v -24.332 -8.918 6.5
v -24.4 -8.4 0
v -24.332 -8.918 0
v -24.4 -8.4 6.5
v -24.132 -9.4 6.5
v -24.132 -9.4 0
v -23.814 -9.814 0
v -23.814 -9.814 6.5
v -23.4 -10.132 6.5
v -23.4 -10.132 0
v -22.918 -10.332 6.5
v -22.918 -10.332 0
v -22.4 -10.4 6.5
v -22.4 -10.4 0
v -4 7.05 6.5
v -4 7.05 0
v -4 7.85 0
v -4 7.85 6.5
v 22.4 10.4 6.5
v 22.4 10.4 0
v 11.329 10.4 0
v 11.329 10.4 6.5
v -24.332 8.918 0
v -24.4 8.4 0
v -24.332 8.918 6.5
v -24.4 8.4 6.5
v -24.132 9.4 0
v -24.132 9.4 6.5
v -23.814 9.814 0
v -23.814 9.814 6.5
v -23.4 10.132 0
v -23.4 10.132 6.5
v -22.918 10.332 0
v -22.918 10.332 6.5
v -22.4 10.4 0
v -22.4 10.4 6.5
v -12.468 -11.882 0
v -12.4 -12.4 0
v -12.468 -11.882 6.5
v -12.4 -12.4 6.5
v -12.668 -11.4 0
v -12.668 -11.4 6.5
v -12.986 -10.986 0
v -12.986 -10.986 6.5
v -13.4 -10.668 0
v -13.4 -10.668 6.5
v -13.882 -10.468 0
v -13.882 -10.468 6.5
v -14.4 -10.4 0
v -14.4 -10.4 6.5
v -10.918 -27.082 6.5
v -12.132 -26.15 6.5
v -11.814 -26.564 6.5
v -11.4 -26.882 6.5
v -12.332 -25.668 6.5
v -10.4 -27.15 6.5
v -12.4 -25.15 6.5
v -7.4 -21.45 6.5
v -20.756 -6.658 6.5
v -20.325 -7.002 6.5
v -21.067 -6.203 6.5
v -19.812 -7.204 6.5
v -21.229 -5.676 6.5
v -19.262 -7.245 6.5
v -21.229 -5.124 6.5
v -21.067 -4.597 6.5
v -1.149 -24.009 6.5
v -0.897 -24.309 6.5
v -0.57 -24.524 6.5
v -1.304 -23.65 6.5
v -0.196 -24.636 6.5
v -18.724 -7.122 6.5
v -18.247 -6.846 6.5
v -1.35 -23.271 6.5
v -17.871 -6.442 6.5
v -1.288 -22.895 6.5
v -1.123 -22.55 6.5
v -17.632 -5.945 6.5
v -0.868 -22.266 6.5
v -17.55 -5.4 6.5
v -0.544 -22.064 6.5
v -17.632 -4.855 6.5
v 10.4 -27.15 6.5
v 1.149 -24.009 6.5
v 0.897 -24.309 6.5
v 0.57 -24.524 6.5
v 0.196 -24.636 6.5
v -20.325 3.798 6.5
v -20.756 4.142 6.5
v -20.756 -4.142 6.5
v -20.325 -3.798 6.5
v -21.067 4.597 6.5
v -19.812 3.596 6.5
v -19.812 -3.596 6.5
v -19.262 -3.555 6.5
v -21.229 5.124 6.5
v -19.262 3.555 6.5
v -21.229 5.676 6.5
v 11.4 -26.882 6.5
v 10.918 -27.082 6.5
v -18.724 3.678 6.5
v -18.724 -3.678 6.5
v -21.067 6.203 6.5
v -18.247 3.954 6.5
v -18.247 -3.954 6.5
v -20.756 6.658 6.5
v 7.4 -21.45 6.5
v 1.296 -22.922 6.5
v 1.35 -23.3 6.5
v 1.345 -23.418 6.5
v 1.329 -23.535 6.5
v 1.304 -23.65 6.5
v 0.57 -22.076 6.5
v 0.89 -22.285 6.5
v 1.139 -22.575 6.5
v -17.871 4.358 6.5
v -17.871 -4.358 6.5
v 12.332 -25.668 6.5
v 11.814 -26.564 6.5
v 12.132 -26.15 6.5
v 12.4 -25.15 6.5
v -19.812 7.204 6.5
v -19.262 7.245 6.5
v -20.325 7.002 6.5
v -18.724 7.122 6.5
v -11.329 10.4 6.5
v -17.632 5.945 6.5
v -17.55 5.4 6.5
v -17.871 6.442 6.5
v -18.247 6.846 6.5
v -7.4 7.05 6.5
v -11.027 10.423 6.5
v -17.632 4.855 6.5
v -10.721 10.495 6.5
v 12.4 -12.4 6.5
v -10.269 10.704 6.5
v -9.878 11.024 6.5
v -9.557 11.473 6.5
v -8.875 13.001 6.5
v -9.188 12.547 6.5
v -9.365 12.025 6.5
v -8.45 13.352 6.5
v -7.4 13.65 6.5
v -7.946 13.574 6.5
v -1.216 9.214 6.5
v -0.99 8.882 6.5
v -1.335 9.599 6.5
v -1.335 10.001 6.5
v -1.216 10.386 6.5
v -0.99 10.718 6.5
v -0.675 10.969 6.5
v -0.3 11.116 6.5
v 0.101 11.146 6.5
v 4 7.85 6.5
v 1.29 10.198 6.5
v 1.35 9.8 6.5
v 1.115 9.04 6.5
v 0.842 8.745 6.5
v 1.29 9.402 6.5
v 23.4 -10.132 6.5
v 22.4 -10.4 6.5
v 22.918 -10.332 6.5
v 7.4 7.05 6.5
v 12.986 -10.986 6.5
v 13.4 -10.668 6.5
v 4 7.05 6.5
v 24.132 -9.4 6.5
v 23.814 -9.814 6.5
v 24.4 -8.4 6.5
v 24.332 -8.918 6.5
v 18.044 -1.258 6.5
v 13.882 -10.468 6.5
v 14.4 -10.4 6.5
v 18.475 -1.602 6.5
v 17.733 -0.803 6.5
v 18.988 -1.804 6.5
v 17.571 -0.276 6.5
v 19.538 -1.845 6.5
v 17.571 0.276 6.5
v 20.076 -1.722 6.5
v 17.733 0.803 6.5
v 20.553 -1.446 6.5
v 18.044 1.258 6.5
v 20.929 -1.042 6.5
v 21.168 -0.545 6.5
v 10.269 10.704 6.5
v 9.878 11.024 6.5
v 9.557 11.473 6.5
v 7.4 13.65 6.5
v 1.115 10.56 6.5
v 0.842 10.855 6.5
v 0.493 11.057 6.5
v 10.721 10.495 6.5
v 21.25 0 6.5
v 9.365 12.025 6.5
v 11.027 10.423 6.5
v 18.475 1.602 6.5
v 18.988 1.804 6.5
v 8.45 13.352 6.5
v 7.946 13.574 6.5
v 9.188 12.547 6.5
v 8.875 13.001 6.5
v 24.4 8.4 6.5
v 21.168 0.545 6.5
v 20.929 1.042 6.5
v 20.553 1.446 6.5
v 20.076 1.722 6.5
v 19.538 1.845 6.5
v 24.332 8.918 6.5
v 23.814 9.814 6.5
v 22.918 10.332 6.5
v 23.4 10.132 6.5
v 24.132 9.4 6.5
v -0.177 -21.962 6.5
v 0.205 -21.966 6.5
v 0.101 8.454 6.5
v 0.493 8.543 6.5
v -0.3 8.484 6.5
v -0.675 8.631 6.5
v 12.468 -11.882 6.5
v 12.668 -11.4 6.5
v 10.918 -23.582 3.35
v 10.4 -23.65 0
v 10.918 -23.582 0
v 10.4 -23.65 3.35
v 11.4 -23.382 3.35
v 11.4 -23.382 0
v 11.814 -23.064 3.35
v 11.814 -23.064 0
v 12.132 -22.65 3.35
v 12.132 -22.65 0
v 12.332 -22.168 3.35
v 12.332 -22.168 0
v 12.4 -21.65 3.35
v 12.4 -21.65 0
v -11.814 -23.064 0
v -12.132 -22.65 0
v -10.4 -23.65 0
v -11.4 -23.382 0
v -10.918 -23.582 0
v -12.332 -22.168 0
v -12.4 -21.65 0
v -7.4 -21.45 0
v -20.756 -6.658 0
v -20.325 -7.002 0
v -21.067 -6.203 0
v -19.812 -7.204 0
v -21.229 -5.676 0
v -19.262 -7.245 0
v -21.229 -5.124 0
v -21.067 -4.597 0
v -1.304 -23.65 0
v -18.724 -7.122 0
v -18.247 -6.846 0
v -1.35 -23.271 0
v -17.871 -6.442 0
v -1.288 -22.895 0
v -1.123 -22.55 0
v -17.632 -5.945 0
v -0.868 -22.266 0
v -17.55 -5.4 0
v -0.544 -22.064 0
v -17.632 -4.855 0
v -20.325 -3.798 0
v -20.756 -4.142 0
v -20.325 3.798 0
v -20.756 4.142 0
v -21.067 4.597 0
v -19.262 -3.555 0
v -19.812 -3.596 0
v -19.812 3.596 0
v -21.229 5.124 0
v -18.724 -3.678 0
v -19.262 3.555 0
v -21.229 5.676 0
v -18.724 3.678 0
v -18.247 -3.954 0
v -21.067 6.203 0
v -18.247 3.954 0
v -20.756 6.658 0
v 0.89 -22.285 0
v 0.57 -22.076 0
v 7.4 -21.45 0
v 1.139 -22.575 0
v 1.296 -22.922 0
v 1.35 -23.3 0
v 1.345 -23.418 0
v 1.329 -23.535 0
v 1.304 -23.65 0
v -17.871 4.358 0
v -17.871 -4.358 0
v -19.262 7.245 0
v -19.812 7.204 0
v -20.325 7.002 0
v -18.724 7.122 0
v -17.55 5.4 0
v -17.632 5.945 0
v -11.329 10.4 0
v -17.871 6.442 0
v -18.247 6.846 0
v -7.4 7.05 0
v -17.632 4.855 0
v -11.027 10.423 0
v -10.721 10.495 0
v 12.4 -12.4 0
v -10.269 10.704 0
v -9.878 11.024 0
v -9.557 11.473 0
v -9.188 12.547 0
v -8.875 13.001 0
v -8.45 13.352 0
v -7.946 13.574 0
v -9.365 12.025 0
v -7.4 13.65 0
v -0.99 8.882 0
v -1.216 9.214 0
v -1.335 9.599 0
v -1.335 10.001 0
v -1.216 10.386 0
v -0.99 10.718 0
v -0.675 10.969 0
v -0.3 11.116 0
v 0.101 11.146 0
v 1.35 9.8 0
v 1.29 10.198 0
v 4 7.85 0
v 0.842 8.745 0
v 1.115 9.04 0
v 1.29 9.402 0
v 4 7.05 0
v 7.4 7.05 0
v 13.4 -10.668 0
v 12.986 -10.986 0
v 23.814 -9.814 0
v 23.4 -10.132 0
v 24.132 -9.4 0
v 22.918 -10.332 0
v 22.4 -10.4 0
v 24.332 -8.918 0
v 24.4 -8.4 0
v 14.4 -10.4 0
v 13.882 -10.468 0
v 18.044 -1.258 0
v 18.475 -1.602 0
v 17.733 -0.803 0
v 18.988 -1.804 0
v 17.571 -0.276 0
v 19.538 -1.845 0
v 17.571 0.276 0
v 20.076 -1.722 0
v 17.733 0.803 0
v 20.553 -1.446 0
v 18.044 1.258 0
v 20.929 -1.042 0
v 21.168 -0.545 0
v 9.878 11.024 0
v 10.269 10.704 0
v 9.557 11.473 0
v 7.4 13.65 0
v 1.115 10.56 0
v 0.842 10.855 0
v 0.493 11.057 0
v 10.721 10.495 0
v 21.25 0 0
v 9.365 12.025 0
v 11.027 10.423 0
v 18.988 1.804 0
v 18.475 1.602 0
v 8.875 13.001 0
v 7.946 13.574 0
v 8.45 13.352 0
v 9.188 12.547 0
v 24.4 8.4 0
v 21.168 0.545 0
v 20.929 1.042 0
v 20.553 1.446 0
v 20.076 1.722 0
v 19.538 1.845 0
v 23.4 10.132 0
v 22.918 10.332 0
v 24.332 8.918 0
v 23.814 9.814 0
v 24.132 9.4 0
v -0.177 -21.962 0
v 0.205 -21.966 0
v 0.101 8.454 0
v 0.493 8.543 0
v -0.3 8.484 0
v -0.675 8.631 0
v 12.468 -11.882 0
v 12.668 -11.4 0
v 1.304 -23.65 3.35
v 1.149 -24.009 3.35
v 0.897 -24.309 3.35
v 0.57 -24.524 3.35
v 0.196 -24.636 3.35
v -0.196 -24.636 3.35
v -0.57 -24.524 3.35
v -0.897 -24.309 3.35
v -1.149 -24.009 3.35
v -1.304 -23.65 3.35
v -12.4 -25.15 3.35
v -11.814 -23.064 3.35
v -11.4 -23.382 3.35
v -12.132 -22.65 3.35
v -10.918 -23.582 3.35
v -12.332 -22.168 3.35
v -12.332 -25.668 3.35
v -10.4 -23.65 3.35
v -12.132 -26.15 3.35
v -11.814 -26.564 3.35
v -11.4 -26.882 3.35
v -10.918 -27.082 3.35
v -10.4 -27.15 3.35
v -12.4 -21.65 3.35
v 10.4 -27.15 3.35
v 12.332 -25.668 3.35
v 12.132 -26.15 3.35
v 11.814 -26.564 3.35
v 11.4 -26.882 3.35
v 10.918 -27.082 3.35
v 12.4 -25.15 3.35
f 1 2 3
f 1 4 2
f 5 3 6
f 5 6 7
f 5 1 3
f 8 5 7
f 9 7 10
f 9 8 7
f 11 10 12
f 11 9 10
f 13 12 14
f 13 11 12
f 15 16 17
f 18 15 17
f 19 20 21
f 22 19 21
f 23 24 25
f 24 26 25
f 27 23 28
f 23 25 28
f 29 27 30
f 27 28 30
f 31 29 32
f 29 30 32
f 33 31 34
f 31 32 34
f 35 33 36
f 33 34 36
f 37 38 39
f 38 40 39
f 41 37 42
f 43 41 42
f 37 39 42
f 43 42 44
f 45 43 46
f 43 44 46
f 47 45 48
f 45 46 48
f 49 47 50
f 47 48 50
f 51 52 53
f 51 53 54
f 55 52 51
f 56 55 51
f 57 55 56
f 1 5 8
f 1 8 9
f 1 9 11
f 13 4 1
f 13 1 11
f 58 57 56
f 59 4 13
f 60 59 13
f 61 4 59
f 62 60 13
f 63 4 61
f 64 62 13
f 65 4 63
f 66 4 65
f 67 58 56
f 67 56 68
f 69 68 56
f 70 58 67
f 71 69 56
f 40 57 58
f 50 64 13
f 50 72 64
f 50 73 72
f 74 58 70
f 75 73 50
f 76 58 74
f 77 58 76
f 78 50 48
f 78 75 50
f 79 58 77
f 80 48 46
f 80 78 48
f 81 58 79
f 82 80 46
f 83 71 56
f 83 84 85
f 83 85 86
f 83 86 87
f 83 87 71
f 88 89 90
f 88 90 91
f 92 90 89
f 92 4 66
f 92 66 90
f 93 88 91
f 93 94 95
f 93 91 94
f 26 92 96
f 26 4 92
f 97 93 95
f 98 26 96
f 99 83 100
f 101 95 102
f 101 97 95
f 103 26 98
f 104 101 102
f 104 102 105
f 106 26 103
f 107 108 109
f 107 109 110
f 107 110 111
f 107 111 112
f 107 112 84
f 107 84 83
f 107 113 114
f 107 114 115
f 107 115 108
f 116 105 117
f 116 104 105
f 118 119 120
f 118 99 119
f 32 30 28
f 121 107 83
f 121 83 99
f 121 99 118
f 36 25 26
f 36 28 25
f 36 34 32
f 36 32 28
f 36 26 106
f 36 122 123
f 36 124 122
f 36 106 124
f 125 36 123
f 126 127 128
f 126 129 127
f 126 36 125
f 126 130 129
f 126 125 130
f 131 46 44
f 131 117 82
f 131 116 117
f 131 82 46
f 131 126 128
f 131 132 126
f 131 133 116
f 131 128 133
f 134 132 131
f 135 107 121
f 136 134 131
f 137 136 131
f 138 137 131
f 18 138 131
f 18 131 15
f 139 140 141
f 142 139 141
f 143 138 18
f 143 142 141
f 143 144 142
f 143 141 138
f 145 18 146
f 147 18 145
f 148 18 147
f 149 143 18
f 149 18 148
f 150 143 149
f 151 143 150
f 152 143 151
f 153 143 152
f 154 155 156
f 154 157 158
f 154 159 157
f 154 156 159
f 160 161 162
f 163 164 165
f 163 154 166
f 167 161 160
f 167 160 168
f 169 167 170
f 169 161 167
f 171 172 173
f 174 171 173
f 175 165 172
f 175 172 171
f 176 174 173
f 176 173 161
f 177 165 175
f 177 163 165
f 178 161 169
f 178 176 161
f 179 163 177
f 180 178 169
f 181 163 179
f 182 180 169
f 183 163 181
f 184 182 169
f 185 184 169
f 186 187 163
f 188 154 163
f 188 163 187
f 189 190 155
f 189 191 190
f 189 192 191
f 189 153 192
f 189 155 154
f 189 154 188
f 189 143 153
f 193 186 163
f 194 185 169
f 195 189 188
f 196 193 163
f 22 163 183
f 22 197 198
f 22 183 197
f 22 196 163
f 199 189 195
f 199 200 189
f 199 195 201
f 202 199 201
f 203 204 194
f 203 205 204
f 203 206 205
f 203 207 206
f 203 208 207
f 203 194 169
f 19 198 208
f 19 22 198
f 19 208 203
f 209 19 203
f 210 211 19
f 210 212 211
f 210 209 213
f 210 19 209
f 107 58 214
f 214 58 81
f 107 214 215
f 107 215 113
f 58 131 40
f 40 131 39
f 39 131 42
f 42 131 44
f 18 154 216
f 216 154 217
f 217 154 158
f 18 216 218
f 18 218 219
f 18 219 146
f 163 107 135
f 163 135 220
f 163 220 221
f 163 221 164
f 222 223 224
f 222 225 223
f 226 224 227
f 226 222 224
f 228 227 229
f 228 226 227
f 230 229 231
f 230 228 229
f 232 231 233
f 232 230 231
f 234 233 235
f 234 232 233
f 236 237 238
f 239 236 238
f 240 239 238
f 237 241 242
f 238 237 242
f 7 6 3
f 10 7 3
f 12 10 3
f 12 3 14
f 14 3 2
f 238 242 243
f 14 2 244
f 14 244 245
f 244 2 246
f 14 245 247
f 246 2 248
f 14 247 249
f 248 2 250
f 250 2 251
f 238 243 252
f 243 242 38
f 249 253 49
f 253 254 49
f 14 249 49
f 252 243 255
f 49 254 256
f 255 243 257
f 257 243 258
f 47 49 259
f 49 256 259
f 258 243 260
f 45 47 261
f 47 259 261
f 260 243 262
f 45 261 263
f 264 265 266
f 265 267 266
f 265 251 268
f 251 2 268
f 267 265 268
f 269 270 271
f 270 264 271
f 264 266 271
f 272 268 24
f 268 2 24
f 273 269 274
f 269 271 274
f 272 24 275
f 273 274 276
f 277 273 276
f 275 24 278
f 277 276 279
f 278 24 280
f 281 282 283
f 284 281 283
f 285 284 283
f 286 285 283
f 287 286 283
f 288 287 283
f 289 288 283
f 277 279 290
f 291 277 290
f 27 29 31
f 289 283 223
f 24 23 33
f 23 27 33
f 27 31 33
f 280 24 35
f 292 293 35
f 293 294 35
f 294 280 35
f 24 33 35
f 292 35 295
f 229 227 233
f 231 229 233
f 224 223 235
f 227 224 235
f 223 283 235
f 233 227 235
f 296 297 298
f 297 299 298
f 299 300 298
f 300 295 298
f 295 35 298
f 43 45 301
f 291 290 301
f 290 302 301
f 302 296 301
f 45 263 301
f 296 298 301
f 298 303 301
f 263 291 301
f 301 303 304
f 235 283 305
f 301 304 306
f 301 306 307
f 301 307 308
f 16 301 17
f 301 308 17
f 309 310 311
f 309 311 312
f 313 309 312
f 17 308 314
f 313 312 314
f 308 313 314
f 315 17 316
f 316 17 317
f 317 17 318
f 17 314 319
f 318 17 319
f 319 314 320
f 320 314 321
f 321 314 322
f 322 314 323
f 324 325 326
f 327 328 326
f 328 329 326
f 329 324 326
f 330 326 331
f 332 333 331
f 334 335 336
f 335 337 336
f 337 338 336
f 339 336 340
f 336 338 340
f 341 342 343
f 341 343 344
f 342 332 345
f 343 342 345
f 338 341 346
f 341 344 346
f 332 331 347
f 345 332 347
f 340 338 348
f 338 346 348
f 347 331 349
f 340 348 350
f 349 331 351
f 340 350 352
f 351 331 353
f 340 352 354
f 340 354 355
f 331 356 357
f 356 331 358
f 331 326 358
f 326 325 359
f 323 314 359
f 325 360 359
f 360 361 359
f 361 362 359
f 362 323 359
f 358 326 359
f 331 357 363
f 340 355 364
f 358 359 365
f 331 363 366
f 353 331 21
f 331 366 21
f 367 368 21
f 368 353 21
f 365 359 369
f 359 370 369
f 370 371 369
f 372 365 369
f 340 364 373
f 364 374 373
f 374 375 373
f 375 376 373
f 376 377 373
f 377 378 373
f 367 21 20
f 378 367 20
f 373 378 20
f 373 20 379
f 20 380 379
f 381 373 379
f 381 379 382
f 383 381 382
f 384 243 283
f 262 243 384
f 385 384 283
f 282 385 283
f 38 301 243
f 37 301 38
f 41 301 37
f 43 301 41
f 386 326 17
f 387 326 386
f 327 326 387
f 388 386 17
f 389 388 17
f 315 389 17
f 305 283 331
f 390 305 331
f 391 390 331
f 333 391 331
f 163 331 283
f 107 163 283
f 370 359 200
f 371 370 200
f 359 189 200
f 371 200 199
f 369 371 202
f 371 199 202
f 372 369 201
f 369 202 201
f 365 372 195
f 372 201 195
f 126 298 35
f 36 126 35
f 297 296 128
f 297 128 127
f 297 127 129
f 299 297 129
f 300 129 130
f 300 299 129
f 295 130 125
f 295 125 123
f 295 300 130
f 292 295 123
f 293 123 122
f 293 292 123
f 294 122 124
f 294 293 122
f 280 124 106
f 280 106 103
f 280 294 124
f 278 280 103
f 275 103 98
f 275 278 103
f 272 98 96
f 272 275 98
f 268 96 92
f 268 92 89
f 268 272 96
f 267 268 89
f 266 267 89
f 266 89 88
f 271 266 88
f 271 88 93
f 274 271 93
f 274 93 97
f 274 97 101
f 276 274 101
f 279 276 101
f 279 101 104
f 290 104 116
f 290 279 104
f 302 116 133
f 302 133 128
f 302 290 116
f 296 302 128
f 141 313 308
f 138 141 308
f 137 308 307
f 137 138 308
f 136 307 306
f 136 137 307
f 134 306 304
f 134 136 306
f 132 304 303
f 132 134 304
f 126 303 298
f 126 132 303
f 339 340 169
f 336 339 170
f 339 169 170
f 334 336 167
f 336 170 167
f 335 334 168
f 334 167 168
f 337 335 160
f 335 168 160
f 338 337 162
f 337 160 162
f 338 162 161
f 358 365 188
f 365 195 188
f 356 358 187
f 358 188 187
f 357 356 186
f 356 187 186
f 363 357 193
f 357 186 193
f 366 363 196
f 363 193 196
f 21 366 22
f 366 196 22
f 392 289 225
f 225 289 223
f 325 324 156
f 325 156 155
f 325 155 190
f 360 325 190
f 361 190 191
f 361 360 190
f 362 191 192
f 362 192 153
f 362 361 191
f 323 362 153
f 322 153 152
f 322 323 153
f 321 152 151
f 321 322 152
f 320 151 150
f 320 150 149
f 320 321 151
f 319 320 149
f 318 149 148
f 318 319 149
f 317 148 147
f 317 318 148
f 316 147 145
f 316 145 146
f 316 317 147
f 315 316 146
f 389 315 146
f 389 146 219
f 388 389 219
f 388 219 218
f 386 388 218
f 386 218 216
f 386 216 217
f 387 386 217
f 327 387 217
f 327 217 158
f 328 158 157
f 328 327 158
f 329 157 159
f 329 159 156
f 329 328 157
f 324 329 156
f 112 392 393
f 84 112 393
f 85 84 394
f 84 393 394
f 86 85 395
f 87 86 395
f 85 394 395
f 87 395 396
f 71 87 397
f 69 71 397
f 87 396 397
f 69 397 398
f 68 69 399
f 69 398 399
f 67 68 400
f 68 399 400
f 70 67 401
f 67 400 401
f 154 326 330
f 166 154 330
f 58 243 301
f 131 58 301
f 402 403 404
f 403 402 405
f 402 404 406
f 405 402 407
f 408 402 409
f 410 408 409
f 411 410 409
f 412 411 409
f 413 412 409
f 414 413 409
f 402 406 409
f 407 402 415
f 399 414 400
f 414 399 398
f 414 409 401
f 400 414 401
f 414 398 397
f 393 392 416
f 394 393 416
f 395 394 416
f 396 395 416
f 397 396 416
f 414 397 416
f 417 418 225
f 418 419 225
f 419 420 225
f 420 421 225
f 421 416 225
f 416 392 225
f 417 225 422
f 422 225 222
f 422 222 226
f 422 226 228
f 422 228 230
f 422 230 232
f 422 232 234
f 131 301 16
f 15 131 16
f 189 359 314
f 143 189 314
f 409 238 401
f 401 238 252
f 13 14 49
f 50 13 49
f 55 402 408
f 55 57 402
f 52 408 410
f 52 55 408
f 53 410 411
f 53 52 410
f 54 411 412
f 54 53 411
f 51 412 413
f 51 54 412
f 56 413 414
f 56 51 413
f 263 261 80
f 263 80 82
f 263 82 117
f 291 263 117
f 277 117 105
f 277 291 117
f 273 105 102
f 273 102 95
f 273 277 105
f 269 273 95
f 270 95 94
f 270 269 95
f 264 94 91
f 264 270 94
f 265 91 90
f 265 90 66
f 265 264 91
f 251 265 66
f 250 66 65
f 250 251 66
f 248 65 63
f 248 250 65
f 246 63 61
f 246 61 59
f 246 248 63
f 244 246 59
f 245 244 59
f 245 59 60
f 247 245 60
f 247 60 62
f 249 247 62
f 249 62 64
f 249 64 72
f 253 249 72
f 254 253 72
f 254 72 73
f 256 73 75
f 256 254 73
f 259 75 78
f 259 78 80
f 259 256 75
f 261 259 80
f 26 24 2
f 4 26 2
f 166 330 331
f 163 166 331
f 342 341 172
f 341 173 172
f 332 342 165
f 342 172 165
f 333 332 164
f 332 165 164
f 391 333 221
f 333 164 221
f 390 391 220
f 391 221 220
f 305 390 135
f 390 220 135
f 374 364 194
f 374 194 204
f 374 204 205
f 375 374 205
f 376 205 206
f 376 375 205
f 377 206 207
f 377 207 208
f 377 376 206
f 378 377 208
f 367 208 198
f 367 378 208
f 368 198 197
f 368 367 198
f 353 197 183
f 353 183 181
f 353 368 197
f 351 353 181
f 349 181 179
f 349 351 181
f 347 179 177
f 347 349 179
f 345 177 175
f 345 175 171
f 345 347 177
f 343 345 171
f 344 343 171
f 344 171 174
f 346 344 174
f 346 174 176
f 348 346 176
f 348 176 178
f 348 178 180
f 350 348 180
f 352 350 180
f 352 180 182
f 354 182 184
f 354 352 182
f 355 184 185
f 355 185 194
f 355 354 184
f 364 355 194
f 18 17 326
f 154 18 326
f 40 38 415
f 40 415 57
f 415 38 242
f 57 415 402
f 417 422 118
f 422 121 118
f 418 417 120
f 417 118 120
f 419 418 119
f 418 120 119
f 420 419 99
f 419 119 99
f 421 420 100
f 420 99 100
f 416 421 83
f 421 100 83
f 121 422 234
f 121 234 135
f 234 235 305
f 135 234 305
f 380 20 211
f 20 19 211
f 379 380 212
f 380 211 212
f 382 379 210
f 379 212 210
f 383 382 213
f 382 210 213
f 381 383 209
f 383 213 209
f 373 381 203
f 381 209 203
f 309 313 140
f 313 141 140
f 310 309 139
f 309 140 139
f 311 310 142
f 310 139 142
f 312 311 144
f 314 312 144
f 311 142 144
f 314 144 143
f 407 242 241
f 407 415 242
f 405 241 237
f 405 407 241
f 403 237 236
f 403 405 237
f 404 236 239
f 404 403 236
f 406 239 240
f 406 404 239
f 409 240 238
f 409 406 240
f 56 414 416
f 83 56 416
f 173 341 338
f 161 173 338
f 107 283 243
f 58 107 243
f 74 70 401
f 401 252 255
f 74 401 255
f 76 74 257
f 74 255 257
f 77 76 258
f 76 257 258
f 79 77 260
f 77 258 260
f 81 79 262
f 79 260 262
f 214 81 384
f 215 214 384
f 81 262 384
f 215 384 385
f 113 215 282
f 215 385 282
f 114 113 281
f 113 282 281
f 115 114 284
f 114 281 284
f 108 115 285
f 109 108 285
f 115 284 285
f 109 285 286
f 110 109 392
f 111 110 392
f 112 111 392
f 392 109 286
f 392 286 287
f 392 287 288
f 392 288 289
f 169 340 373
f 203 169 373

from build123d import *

# Parameters (mm, degrees)
F0_R     = 1.85
F0_R_2   = 1.35
F1_DEPTH = 6.5
F2_START = 3.35
F2_DEPTH = 3.15
F3_R     = 2
F4_R     = 2


with BuildPart() as f1:
    # F0 (on Top) → F1 (new body)
    with BuildSketch(Plane.XY):
        with BuildLine():
            Line((-7.4, -10.4), (-12.4, -10.4))
            Line((-12.4, -10.4), (-12.4, -23.65))
            Line((-12.4, -23.65), (-1.303840481, -23.65))
            ThreePointArc((-1.303840481, -23.65), (-0.1765153684, -21.9615896277), (1.35, -23.3))
            ThreePointArc((1.35, -23.3), (1.3384103723, -23.4765153684), (1.303840481, -23.65))
            Line((1.303840481, -23.65), (12.4, -23.65))
            Line((12.4, -23.65), (12.4, -10.4))
            Line((12.4, -10.4), (7.4, -10.4))
            Line((7.4, -10.4), (7.4, -20.25))
            Line((7.4, -20.25), (7.4, -21.45))
            Line((7.4, -21.45), (-7.4, -21.45))
            Line((-7.4, -21.45), (-7.4, -20.25))
            Line((-7.4, -20.25), (-7.4, -10.4))
        make_face()
        Polygon((-24.4, -5.2615826042), (-24.4, -10.4), (-12.4, -10.4), (-7.4, -10.4), (-7.4, 7.05), (-4, 7.05), (-4, 7.85), (4, 7.85), (4, 7.05), (7.4, 7.05), (7.4, -10.4), (12.4, -10.4), (24.4, -10.4), (24.4, 10.4), (9.4, 10.4), (9.4, 13.65), (-9.4, 13.65), (-9.4, 10.4), (-24.4, 10.4), align=None)
        with Locations((-19.4, -5.4)):
            Circle(F0_R, mode=Mode.SUBTRACT)
        with Locations((-19.4, 5.4)):
            Circle(F0_R, mode=Mode.SUBTRACT)
        with Locations((19.4, 0)):
            Circle(F0_R, mode=Mode.SUBTRACT)
        with Locations((0, 9.8)):
            Circle(F0_R_2, mode=Mode.SUBTRACT)
    extrude(amount=F1_DEPTH)

    # F0 (on Top) → F2 (join)
    with BuildSketch(Plane.XY.offset(F2_START)):
        with BuildLine():
            Line((-1.303840481, -23.65), (-12.4, -23.65))
            Line((-12.4, -23.65), (-12.4, -27.15))
            Line((-12.4, -27.15), (12.4, -27.15))
            Line((12.4, -27.15), (12.4, -23.65))
            Line((12.4, -23.65), (1.303840481, -23.65))
            ThreePointArc((1.303840481, -23.65), (0, -24.65), (-1.303840481, -23.65))
        make_face()
    extrude(amount=F2_DEPTH)

    # F3
    f3_edges = [f1.edges().sort_by_distance(p)[0] for p in [
        (-24.4, -10.4, 3.25),
        (-24.4, 10.4, 3.25),
        (24.4, -10.4, 3.25),
        (24.4, 10.4, 3.25),
        (9.4, 13.65, 3.25),
        (-12.4, -27.15, 4.925),
        (-12.4, -23.65, 1.675),
        (12.4, -27.15, 4.925),
        (12.4, -23.65, 1.675),
        (12.4, -10.4, 3.25),
        (-12.4, -10.4, 3.25),
        (-9.4, 13.65, 3.25),
    ]]
    fillet(f3_edges, radius=F3_R)

    # F4
    f4_edges = [f1.edges().sort_by_distance(p)[0] for p in [
        (-9.4, 10.4, 3.25),
        (9.4, 10.4, 3.25),
    ]]
    fillet(f4_edges, radius=F4_R)


solid = f1.part
